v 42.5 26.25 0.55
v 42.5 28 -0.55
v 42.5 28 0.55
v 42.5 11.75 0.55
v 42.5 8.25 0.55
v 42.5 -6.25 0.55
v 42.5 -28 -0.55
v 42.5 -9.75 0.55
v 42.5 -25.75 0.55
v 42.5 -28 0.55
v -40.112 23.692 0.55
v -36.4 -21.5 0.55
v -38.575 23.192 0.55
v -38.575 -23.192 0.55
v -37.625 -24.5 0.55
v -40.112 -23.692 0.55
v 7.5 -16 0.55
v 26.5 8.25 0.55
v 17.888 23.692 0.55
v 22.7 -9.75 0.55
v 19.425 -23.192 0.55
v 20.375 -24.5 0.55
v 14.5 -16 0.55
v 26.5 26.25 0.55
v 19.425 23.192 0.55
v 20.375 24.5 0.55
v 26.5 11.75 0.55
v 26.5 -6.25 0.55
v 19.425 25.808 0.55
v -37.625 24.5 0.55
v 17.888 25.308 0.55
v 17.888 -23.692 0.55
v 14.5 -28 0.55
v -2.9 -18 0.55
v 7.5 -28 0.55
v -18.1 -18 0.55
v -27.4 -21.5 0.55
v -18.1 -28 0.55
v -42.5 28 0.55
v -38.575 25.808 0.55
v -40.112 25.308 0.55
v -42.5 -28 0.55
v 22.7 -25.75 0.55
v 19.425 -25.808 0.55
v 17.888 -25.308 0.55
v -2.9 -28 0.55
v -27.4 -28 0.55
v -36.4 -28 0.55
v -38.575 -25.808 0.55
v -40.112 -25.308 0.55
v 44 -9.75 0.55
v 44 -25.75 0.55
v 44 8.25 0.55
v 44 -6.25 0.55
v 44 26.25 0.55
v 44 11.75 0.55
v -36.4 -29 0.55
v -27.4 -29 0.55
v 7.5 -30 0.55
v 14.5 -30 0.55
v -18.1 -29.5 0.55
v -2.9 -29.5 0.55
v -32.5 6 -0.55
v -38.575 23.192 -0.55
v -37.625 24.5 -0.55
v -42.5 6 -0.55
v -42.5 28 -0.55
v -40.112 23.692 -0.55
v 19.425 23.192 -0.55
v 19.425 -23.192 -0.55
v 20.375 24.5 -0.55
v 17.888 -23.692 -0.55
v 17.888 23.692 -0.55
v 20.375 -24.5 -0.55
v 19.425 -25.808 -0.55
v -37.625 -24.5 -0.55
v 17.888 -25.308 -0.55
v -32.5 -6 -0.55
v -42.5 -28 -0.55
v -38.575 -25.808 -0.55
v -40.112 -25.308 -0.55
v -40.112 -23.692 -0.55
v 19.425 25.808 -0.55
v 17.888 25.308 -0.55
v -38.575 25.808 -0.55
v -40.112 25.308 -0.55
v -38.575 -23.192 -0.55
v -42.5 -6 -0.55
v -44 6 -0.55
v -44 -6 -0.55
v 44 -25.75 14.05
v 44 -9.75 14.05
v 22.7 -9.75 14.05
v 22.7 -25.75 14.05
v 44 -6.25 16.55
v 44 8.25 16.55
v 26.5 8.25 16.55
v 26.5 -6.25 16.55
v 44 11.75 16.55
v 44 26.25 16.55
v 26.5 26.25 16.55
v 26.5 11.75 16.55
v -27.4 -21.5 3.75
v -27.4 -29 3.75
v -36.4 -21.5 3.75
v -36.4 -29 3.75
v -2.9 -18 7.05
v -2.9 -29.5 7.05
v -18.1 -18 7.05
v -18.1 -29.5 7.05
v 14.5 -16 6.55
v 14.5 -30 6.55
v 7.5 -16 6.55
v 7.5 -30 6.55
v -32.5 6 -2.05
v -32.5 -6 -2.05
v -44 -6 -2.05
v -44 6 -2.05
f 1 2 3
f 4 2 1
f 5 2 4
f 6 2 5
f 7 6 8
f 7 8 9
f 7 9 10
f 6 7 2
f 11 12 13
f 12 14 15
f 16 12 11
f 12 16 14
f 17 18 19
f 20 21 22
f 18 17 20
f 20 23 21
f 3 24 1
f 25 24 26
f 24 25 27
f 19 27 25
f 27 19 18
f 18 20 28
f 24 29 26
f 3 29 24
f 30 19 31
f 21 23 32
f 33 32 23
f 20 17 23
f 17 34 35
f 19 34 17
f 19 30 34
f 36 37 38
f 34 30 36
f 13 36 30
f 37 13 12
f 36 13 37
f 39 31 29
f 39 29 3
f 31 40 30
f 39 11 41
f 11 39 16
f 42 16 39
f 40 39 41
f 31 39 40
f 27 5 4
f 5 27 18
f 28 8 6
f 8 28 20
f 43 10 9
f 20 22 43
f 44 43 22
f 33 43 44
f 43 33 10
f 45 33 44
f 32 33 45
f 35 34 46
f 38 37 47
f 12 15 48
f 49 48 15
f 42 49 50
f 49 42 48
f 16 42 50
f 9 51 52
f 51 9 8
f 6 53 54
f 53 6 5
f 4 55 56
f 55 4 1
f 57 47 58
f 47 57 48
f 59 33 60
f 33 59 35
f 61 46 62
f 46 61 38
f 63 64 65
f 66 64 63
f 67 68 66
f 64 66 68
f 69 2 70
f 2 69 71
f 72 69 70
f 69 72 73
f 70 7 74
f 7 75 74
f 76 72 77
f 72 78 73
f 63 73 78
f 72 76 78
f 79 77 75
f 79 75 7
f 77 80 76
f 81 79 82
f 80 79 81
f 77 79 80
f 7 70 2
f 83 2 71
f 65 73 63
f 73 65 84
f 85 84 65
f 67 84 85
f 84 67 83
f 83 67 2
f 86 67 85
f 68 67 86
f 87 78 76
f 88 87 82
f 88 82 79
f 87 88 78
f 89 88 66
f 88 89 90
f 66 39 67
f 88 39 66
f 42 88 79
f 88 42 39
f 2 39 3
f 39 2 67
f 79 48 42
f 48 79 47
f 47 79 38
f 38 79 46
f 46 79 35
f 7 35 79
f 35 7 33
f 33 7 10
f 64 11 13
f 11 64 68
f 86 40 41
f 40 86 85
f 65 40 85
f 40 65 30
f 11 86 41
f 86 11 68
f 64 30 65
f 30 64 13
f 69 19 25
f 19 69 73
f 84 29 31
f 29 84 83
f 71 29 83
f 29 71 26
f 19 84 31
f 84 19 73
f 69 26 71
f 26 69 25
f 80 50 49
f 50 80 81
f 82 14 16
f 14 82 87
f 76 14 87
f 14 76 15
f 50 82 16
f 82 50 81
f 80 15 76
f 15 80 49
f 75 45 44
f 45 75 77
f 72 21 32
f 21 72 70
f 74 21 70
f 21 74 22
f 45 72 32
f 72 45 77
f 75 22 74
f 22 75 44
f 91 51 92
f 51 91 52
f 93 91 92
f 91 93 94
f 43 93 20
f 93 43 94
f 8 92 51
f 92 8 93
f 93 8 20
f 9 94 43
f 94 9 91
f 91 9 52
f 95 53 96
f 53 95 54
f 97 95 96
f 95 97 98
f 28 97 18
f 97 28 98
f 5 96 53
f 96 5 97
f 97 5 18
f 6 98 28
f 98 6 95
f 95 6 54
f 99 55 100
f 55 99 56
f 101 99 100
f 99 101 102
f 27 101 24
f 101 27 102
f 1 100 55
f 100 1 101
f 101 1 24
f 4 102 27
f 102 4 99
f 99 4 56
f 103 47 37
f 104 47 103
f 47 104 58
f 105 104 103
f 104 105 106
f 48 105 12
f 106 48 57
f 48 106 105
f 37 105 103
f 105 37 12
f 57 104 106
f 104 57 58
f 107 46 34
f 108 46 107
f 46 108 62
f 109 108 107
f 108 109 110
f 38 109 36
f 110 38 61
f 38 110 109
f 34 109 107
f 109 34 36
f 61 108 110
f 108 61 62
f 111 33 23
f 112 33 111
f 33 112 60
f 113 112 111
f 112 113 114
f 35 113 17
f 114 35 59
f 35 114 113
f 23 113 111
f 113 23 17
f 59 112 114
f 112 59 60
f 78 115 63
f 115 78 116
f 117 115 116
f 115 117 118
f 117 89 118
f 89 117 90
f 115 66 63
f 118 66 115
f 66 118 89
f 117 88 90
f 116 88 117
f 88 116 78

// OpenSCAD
// ref :
// - https://www.raspberrypi-spy.co.uk/2012/03/mechanical-data-dimensions/
// - https://www.raspberrypi-spy.co.uk/wp-content/uploads/2012/03/Raspberry-Pi-3B-V1.2-Mechanical-1.png
module raspi_3b() {
    difference() {
        // PCB
        cube([85,56,1.1], center=true);        
        // PCB holes
        dy=49/2;
        dx1=-85/2+3.5;
        dx2=dx1+58;
        translate([dx1,dy,0])
            cylinder(h=8,d=2.75,center=true);
        translate([dx2,dy,0])
            cylinder(h=8,d=2.75,center=true);
        translate([dx1,-dy,0])
            cylinder(h=8,d=2.75,center=true);
        translate([dx2,-dy,0])
            cylinder(h=8,d=2.75,center=true);
    }    
    // Ethernet port
    // Center is 10.25mm from the bottom edge, length is ~21.3mm, width ~16mm, height ~13.5mm.
    // Port typically overhangs PCB edge by ~1.5mm
    color("silver")
    translate([85/2 - 21.3/2 + 1.5, -56/2 + 10.25, 1.1/2 + 13.5/2])
        cube([21.3, 16, 13.5], center=true);

    // USB port 1 (middle)
    // Center is 29.0mm from the bottom edge, length is ~17.5mm, width ~14.5mm, height ~16mm
    color("silver")
    translate([85/2 - 17.5/2 + 1.5, -56/2 + 29.0, 1.1/2 + 16/2])
        cube([17.5, 14.5, 16], center=true);

    // USB port 2 (top)
    // Center is 47.0mm from the bottom edge
    color("silver")
    translate([85/2 - 17.5/2 + 1.5, -56/2 + 47.0, 1.1/2 + 16/2])
        cube([17.5, 14.5, 16], center=true);

    // Power plug (USB-C dimensions as requested)
    // Center is 10.6mm from the SD-card edge (left edge)
    color("silver")
    translate([-85/2 + 10.6, -56/2 + 7.5/2 - 1.0, 1.1/2 + 3.2/2])
        cube([9.0, 7.5, 3.2], center=true);

    // HDMI port (Full size HDMI for Pi 3B)
    // Center is 32.0mm from the SD-card edge (left edge)
    color("silver")
    translate([-85/2 + 32.0, -56/2 + 11.5/2 - 1.5, 1.1/2 + 6.5/2])
        cube([15.2, 11.5, 6.5], center=true);

    // 3.5mm Audio/Video Jack
    // Center is 53.5mm from the SD-card edge (left edge)
    color("black")
    translate([-85/2 + 53.5, -56/2 + 14.0/2 - 2.0, 1.1/2 + 6.0/2])
        cube([7.0, 14.0, 6.0], center=true);

    // MicroSD slot
    // Underside of PCB, centered on Y-axis, extending past left edge
    color("darkgray")
    translate([-85/2 + 11.5/2 - 1.5, 0, -1.1/2 - 1.5/2])
        cube([11.5, 12.0, 1.5], center=true);
}


raspi_3b();
